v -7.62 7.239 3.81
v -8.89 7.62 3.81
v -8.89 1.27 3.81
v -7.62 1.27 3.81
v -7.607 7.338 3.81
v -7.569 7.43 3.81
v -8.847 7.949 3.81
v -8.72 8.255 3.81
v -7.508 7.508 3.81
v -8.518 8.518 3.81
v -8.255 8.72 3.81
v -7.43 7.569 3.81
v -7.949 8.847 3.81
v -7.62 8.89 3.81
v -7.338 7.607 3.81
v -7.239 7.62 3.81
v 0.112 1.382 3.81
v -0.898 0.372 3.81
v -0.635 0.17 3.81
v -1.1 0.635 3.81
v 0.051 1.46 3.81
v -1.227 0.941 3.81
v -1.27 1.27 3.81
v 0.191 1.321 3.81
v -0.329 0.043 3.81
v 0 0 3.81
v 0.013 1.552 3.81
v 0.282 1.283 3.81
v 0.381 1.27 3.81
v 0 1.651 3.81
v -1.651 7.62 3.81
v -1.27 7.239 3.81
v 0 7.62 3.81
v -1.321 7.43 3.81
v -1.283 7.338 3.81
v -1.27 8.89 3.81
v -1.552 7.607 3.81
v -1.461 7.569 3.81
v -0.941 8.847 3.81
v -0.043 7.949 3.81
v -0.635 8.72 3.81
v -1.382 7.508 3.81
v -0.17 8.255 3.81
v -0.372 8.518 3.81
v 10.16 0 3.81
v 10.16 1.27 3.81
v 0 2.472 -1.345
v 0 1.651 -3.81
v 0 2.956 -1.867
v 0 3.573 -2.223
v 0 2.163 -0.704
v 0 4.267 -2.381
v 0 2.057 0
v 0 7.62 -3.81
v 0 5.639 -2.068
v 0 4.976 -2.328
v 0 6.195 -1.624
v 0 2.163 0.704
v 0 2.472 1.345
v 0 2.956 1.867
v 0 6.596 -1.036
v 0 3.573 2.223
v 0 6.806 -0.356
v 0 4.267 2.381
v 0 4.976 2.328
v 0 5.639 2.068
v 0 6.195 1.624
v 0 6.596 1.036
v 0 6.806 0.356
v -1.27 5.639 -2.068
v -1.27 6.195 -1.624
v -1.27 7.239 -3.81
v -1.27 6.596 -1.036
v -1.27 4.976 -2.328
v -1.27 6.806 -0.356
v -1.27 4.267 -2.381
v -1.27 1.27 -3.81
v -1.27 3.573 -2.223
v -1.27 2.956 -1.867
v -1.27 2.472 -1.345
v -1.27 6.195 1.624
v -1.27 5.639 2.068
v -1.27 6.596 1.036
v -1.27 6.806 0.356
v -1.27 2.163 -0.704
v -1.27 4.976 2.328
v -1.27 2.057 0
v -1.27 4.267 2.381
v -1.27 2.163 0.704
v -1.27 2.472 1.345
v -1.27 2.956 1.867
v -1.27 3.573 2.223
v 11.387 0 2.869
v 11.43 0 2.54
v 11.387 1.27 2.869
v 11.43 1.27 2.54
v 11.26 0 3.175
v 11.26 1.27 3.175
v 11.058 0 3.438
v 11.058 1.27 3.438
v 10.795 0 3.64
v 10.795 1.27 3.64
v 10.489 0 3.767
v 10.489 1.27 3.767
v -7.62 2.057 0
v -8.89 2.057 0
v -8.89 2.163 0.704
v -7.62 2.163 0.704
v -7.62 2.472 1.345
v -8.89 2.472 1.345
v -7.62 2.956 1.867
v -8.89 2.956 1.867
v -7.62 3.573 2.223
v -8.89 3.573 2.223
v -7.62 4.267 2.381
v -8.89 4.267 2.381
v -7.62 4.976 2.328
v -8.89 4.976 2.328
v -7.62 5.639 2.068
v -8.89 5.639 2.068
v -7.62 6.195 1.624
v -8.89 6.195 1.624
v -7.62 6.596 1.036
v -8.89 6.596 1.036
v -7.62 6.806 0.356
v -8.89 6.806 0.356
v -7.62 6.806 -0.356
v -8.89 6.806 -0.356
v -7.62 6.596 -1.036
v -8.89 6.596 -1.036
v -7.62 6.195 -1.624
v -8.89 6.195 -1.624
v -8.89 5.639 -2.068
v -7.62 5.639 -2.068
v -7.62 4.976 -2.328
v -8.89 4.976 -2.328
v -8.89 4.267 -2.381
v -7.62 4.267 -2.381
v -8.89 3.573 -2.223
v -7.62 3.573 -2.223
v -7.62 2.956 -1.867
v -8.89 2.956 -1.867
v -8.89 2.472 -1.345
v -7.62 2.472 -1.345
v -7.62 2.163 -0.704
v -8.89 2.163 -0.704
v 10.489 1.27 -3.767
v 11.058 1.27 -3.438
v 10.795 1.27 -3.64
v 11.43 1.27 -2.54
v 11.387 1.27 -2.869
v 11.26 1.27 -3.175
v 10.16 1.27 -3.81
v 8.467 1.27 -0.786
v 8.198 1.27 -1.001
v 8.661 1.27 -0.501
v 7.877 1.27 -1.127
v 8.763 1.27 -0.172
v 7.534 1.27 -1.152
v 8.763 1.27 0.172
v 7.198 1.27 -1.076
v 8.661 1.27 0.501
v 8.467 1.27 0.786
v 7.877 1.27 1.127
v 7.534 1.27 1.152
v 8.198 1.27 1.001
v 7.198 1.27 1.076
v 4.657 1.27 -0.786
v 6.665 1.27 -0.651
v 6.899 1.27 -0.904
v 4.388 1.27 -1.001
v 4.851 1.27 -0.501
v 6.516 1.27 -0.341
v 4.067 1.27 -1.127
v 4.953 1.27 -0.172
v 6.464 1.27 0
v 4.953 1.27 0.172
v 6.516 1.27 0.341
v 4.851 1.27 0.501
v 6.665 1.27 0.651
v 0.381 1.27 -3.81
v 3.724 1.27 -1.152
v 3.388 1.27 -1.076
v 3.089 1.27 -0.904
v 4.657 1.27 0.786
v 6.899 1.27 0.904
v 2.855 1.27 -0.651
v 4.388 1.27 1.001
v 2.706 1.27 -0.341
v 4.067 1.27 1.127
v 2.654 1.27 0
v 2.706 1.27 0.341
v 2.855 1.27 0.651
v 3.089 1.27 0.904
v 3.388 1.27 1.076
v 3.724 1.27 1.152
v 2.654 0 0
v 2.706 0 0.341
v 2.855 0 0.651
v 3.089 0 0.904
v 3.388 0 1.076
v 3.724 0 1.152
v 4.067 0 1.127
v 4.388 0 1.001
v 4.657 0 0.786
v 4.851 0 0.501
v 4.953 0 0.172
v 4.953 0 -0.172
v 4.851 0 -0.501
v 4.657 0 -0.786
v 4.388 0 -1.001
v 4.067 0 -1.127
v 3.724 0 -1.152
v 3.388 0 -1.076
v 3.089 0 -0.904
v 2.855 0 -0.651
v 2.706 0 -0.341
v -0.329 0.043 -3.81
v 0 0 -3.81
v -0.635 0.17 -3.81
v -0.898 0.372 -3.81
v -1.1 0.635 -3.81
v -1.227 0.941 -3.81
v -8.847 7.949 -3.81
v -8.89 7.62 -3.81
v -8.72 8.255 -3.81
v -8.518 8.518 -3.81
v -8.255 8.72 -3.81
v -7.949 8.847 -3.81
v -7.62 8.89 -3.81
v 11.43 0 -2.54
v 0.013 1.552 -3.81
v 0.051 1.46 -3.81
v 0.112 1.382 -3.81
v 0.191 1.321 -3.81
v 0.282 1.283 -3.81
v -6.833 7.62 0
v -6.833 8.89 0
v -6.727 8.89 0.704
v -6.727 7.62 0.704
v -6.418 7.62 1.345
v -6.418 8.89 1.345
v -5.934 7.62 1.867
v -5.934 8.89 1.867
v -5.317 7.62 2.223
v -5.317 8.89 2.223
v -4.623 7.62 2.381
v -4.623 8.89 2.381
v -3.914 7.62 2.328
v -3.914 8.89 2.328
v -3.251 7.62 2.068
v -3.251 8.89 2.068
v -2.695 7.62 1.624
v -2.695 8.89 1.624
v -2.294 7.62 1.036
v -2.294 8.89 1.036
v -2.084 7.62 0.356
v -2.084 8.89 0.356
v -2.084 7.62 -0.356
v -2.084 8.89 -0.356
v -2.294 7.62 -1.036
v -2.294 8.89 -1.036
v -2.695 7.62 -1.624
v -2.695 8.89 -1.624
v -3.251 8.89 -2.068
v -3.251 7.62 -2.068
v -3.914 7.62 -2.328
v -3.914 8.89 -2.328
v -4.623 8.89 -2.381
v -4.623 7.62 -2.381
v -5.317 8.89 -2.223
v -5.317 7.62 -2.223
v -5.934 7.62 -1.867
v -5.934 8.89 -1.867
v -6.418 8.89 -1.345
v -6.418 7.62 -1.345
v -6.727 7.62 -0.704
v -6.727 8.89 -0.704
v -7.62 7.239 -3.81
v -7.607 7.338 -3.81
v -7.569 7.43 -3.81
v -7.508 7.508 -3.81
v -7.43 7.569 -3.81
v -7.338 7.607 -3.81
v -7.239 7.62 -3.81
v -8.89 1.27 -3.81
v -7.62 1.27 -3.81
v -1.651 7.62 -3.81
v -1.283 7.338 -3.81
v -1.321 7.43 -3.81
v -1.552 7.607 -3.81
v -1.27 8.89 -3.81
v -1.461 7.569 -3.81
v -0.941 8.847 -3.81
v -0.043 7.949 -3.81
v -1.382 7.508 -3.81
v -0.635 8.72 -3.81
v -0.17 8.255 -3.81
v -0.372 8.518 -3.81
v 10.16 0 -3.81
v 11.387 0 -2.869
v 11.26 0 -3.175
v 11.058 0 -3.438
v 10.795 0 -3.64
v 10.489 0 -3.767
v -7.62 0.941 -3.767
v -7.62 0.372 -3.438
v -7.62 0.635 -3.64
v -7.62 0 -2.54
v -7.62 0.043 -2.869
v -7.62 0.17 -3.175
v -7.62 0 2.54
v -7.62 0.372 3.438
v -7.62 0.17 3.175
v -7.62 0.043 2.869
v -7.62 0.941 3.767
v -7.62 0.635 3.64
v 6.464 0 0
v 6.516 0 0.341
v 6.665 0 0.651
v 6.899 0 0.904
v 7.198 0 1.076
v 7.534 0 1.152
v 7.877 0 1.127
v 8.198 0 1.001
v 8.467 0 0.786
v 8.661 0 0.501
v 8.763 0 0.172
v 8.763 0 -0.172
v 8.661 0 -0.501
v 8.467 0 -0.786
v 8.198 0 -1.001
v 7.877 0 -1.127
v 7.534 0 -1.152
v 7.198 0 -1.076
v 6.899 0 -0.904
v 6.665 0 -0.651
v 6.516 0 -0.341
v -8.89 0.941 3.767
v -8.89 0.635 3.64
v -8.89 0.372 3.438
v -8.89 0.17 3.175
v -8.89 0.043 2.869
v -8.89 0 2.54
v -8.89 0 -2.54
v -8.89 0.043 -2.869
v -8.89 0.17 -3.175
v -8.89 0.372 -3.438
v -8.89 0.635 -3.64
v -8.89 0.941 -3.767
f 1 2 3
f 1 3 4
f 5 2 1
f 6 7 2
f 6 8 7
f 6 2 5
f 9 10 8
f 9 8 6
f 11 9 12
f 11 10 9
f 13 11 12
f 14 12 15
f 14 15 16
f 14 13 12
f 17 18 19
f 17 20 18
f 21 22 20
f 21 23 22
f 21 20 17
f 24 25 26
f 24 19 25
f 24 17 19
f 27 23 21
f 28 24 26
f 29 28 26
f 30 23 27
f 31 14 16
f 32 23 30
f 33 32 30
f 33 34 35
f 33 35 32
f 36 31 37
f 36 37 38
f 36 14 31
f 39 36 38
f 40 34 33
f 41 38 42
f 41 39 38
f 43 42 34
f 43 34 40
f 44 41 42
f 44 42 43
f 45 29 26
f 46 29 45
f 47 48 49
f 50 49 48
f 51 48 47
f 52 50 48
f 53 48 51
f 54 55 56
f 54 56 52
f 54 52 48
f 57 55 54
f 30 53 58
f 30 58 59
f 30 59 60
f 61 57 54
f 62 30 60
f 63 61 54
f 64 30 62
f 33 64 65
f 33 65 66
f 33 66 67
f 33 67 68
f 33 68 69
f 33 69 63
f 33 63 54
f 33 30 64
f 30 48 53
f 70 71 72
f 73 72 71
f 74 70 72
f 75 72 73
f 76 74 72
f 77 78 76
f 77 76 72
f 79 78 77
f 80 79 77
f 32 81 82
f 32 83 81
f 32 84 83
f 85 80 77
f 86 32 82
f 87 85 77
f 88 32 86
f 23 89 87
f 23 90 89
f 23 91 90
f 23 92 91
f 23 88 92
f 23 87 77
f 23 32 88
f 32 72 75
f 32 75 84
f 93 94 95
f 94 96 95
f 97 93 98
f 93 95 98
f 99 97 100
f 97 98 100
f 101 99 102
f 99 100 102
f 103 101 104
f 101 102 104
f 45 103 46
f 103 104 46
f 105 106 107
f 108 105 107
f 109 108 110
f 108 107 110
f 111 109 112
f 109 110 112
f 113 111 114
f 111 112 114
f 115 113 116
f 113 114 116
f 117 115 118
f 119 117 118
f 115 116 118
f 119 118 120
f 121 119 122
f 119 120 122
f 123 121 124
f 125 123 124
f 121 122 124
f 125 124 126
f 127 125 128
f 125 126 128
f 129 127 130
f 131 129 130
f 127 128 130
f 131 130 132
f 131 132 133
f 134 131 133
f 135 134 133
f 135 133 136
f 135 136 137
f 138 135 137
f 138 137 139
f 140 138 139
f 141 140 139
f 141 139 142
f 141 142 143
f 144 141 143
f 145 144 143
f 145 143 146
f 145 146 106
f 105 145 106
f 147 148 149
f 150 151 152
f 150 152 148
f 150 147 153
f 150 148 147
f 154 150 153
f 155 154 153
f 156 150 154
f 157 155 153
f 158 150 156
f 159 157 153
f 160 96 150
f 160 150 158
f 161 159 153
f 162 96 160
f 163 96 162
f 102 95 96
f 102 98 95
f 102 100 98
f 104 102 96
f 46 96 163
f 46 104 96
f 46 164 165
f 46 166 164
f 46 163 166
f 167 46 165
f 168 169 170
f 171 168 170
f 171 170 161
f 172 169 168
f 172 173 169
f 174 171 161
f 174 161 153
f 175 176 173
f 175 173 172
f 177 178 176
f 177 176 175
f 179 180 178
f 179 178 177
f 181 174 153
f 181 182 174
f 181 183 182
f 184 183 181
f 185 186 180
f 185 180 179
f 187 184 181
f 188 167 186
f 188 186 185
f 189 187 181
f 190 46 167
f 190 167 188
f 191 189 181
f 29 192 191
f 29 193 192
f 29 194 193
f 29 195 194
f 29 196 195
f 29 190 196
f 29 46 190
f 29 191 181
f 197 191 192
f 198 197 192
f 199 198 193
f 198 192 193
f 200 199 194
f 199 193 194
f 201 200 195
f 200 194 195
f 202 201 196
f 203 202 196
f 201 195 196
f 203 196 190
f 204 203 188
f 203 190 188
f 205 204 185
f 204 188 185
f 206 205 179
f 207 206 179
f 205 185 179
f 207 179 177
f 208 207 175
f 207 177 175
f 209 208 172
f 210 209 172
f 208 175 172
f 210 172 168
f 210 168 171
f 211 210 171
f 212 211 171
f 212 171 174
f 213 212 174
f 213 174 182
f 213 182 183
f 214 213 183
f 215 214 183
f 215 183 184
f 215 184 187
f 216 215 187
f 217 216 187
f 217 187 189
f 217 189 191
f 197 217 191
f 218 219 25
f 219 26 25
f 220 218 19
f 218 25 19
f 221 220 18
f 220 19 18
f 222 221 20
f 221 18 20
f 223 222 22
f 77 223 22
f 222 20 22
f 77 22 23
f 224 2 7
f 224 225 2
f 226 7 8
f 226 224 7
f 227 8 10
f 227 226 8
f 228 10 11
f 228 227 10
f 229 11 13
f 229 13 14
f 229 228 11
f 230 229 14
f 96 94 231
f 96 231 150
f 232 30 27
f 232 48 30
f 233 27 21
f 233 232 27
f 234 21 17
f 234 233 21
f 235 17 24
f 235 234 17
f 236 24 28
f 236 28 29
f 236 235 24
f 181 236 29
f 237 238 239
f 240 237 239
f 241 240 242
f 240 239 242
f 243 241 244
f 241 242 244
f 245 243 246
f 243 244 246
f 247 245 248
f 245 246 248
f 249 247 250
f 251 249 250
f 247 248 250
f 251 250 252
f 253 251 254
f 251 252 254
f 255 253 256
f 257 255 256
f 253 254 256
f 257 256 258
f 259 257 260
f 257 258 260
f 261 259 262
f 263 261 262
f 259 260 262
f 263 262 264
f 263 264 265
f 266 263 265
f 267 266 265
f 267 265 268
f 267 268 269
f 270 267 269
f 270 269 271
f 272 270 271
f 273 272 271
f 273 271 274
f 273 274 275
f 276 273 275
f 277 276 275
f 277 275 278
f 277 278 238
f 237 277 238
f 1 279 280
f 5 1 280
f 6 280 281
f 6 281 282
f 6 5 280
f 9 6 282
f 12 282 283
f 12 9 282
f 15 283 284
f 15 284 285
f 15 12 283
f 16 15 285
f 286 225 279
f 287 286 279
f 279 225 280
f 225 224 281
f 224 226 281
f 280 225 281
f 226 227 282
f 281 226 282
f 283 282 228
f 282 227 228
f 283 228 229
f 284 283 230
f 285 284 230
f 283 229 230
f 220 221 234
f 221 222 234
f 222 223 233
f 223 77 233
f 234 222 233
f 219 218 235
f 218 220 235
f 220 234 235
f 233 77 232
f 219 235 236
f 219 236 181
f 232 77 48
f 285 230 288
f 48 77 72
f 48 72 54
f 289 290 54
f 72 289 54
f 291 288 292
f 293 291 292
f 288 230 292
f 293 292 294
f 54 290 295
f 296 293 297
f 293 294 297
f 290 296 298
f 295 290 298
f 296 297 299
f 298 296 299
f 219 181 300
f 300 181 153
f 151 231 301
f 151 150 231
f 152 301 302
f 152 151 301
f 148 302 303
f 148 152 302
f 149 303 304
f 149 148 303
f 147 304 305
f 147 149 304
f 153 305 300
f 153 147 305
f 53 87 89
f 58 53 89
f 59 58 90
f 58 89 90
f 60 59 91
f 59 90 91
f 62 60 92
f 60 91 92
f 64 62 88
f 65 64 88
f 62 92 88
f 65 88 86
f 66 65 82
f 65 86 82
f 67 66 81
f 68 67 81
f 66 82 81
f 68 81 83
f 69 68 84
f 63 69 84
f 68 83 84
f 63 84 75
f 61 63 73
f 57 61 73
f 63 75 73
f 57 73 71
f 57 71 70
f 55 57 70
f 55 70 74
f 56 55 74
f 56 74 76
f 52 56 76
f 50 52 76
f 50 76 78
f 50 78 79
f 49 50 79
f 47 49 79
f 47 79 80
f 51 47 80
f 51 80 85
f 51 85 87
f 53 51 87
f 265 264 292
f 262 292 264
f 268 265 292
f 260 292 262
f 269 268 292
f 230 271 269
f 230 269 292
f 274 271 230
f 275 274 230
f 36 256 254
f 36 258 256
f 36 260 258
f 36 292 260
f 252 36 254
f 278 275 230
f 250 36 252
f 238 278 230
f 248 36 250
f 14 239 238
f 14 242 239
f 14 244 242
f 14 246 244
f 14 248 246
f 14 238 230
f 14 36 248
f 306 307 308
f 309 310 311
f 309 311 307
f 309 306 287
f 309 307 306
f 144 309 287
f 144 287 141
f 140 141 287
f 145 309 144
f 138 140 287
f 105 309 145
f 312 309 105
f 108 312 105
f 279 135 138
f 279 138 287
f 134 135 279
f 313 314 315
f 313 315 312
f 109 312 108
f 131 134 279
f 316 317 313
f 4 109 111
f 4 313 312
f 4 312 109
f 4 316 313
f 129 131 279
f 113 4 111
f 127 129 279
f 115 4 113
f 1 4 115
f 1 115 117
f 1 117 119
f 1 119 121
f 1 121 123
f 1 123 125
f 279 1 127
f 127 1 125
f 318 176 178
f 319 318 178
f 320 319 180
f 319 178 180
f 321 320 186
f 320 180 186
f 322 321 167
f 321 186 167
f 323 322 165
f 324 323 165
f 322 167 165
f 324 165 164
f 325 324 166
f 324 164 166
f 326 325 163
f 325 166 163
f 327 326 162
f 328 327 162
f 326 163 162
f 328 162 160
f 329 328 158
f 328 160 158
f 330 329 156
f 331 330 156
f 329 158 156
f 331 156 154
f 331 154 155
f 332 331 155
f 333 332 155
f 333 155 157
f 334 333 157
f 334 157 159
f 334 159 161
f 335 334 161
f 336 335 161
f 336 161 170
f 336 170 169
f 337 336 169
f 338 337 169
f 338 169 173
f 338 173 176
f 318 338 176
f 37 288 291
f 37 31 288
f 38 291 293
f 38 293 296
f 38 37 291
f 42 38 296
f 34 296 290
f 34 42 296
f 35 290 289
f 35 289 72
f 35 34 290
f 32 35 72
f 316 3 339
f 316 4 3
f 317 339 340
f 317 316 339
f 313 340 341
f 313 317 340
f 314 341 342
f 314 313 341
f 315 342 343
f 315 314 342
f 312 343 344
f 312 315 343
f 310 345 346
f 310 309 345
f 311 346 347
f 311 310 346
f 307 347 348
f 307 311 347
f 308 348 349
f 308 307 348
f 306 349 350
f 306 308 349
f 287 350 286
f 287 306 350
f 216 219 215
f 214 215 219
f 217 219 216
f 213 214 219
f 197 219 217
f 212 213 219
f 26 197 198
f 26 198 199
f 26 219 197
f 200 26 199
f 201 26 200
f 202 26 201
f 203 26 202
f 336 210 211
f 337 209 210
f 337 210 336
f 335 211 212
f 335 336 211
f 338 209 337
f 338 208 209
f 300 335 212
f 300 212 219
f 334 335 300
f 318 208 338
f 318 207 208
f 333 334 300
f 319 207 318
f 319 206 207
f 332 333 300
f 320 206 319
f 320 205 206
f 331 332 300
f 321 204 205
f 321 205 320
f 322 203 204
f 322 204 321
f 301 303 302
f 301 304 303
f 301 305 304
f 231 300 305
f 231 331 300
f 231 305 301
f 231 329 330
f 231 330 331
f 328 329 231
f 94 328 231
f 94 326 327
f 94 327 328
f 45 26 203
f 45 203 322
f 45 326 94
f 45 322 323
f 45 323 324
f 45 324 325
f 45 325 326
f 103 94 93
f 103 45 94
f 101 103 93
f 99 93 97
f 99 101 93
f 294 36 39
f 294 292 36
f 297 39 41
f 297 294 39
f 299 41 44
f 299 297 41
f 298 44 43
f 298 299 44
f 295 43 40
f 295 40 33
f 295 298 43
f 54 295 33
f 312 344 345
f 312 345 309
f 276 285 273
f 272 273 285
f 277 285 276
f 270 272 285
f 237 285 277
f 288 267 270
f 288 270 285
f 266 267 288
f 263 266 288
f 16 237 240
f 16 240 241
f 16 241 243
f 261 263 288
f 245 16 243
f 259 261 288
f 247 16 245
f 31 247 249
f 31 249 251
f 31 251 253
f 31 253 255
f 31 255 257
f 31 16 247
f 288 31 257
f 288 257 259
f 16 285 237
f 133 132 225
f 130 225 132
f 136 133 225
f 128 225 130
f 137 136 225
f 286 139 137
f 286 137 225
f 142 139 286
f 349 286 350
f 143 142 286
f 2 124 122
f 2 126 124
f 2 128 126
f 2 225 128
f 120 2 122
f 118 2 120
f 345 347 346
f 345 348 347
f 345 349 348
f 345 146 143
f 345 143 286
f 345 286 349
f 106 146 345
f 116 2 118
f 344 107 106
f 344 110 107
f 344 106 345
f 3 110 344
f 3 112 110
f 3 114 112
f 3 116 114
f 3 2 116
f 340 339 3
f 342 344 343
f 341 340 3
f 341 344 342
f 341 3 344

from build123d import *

# Parameters (mm, degrees)
F1_DEPTH = 3.81
F3_R     = 1.27
F4_R     = 0.381
F5_D     = 2.3114
F6_R     = 2.3876
F7_DEPTH = 25.4
F8_R     = 2.3876
F9_DEPTH = 25.4


with BuildPart() as f1:
    # F0 (on Top) → F1 (new body, symmetric)
    with BuildSketch(Plane.XY):
        Polygon((-8.89, 8.89), (-8.89, 0), (-7.62, 0), (-7.62, 7.62), (-1.27, 7.62), (-1.27, 0), (11.43, 0), (11.43, 1.27), (0, 1.27), (0, 8.89), align=None)
    extrude(amount=F1_DEPTH, both=True)

    # F3
    f3_edges = [f1.edges().sort_by_distance(p)[0] for p in [
        (11.43, 0.635, 3.81),
        (11.43, 0.635, -3.81),
        (-8.255, 0, 3.81),
        (-8.255, 0, -3.81),
        (-1.27, 0, 0),
        (0, 8.89, 0),
        (-8.89, 8.89, 0),
    ]]
    fillet(f3_edges, radius=F3_R)

    # F4
    f4_edges = [f1.edges().sort_by_distance(p)[0] for p in [
        (-7.62, 7.62, 0),
        (-1.27, 7.62, 0),
        (0, 1.27, 0),
    ]]
    fillet(f4_edges, radius=F4_R)

    # F5 (through all)
    with Locations(Plane.XZ):
        with Locations((7.62, 0), (3.81, 0)):
            Hole(F5_D / 2)

    # F6 (on face) → F7 (cut)
    with BuildSketch(Plane(origin=(-8.89, 0, 0), x_dir=(0, -1, 0), z_dir=(-1, 0, 0))):
        with Locations((-4.445, 0)):
            Circle(F6_R)
    extrude(amount=-F7_DEPTH, mode=Mode.SUBTRACT)

    # F8 (on face) → F9 (cut)
    with BuildSketch(Plane(origin=(0, 8.89, 0), x_dir=(-1, 0, 0), z_dir=(0, 1, 0))):
        with Locations((4.445, 0)):
            Circle(F8_R)
    extrude(amount=-F9_DEPTH, mode=Mode.SUBTRACT)


solid = f1.part
